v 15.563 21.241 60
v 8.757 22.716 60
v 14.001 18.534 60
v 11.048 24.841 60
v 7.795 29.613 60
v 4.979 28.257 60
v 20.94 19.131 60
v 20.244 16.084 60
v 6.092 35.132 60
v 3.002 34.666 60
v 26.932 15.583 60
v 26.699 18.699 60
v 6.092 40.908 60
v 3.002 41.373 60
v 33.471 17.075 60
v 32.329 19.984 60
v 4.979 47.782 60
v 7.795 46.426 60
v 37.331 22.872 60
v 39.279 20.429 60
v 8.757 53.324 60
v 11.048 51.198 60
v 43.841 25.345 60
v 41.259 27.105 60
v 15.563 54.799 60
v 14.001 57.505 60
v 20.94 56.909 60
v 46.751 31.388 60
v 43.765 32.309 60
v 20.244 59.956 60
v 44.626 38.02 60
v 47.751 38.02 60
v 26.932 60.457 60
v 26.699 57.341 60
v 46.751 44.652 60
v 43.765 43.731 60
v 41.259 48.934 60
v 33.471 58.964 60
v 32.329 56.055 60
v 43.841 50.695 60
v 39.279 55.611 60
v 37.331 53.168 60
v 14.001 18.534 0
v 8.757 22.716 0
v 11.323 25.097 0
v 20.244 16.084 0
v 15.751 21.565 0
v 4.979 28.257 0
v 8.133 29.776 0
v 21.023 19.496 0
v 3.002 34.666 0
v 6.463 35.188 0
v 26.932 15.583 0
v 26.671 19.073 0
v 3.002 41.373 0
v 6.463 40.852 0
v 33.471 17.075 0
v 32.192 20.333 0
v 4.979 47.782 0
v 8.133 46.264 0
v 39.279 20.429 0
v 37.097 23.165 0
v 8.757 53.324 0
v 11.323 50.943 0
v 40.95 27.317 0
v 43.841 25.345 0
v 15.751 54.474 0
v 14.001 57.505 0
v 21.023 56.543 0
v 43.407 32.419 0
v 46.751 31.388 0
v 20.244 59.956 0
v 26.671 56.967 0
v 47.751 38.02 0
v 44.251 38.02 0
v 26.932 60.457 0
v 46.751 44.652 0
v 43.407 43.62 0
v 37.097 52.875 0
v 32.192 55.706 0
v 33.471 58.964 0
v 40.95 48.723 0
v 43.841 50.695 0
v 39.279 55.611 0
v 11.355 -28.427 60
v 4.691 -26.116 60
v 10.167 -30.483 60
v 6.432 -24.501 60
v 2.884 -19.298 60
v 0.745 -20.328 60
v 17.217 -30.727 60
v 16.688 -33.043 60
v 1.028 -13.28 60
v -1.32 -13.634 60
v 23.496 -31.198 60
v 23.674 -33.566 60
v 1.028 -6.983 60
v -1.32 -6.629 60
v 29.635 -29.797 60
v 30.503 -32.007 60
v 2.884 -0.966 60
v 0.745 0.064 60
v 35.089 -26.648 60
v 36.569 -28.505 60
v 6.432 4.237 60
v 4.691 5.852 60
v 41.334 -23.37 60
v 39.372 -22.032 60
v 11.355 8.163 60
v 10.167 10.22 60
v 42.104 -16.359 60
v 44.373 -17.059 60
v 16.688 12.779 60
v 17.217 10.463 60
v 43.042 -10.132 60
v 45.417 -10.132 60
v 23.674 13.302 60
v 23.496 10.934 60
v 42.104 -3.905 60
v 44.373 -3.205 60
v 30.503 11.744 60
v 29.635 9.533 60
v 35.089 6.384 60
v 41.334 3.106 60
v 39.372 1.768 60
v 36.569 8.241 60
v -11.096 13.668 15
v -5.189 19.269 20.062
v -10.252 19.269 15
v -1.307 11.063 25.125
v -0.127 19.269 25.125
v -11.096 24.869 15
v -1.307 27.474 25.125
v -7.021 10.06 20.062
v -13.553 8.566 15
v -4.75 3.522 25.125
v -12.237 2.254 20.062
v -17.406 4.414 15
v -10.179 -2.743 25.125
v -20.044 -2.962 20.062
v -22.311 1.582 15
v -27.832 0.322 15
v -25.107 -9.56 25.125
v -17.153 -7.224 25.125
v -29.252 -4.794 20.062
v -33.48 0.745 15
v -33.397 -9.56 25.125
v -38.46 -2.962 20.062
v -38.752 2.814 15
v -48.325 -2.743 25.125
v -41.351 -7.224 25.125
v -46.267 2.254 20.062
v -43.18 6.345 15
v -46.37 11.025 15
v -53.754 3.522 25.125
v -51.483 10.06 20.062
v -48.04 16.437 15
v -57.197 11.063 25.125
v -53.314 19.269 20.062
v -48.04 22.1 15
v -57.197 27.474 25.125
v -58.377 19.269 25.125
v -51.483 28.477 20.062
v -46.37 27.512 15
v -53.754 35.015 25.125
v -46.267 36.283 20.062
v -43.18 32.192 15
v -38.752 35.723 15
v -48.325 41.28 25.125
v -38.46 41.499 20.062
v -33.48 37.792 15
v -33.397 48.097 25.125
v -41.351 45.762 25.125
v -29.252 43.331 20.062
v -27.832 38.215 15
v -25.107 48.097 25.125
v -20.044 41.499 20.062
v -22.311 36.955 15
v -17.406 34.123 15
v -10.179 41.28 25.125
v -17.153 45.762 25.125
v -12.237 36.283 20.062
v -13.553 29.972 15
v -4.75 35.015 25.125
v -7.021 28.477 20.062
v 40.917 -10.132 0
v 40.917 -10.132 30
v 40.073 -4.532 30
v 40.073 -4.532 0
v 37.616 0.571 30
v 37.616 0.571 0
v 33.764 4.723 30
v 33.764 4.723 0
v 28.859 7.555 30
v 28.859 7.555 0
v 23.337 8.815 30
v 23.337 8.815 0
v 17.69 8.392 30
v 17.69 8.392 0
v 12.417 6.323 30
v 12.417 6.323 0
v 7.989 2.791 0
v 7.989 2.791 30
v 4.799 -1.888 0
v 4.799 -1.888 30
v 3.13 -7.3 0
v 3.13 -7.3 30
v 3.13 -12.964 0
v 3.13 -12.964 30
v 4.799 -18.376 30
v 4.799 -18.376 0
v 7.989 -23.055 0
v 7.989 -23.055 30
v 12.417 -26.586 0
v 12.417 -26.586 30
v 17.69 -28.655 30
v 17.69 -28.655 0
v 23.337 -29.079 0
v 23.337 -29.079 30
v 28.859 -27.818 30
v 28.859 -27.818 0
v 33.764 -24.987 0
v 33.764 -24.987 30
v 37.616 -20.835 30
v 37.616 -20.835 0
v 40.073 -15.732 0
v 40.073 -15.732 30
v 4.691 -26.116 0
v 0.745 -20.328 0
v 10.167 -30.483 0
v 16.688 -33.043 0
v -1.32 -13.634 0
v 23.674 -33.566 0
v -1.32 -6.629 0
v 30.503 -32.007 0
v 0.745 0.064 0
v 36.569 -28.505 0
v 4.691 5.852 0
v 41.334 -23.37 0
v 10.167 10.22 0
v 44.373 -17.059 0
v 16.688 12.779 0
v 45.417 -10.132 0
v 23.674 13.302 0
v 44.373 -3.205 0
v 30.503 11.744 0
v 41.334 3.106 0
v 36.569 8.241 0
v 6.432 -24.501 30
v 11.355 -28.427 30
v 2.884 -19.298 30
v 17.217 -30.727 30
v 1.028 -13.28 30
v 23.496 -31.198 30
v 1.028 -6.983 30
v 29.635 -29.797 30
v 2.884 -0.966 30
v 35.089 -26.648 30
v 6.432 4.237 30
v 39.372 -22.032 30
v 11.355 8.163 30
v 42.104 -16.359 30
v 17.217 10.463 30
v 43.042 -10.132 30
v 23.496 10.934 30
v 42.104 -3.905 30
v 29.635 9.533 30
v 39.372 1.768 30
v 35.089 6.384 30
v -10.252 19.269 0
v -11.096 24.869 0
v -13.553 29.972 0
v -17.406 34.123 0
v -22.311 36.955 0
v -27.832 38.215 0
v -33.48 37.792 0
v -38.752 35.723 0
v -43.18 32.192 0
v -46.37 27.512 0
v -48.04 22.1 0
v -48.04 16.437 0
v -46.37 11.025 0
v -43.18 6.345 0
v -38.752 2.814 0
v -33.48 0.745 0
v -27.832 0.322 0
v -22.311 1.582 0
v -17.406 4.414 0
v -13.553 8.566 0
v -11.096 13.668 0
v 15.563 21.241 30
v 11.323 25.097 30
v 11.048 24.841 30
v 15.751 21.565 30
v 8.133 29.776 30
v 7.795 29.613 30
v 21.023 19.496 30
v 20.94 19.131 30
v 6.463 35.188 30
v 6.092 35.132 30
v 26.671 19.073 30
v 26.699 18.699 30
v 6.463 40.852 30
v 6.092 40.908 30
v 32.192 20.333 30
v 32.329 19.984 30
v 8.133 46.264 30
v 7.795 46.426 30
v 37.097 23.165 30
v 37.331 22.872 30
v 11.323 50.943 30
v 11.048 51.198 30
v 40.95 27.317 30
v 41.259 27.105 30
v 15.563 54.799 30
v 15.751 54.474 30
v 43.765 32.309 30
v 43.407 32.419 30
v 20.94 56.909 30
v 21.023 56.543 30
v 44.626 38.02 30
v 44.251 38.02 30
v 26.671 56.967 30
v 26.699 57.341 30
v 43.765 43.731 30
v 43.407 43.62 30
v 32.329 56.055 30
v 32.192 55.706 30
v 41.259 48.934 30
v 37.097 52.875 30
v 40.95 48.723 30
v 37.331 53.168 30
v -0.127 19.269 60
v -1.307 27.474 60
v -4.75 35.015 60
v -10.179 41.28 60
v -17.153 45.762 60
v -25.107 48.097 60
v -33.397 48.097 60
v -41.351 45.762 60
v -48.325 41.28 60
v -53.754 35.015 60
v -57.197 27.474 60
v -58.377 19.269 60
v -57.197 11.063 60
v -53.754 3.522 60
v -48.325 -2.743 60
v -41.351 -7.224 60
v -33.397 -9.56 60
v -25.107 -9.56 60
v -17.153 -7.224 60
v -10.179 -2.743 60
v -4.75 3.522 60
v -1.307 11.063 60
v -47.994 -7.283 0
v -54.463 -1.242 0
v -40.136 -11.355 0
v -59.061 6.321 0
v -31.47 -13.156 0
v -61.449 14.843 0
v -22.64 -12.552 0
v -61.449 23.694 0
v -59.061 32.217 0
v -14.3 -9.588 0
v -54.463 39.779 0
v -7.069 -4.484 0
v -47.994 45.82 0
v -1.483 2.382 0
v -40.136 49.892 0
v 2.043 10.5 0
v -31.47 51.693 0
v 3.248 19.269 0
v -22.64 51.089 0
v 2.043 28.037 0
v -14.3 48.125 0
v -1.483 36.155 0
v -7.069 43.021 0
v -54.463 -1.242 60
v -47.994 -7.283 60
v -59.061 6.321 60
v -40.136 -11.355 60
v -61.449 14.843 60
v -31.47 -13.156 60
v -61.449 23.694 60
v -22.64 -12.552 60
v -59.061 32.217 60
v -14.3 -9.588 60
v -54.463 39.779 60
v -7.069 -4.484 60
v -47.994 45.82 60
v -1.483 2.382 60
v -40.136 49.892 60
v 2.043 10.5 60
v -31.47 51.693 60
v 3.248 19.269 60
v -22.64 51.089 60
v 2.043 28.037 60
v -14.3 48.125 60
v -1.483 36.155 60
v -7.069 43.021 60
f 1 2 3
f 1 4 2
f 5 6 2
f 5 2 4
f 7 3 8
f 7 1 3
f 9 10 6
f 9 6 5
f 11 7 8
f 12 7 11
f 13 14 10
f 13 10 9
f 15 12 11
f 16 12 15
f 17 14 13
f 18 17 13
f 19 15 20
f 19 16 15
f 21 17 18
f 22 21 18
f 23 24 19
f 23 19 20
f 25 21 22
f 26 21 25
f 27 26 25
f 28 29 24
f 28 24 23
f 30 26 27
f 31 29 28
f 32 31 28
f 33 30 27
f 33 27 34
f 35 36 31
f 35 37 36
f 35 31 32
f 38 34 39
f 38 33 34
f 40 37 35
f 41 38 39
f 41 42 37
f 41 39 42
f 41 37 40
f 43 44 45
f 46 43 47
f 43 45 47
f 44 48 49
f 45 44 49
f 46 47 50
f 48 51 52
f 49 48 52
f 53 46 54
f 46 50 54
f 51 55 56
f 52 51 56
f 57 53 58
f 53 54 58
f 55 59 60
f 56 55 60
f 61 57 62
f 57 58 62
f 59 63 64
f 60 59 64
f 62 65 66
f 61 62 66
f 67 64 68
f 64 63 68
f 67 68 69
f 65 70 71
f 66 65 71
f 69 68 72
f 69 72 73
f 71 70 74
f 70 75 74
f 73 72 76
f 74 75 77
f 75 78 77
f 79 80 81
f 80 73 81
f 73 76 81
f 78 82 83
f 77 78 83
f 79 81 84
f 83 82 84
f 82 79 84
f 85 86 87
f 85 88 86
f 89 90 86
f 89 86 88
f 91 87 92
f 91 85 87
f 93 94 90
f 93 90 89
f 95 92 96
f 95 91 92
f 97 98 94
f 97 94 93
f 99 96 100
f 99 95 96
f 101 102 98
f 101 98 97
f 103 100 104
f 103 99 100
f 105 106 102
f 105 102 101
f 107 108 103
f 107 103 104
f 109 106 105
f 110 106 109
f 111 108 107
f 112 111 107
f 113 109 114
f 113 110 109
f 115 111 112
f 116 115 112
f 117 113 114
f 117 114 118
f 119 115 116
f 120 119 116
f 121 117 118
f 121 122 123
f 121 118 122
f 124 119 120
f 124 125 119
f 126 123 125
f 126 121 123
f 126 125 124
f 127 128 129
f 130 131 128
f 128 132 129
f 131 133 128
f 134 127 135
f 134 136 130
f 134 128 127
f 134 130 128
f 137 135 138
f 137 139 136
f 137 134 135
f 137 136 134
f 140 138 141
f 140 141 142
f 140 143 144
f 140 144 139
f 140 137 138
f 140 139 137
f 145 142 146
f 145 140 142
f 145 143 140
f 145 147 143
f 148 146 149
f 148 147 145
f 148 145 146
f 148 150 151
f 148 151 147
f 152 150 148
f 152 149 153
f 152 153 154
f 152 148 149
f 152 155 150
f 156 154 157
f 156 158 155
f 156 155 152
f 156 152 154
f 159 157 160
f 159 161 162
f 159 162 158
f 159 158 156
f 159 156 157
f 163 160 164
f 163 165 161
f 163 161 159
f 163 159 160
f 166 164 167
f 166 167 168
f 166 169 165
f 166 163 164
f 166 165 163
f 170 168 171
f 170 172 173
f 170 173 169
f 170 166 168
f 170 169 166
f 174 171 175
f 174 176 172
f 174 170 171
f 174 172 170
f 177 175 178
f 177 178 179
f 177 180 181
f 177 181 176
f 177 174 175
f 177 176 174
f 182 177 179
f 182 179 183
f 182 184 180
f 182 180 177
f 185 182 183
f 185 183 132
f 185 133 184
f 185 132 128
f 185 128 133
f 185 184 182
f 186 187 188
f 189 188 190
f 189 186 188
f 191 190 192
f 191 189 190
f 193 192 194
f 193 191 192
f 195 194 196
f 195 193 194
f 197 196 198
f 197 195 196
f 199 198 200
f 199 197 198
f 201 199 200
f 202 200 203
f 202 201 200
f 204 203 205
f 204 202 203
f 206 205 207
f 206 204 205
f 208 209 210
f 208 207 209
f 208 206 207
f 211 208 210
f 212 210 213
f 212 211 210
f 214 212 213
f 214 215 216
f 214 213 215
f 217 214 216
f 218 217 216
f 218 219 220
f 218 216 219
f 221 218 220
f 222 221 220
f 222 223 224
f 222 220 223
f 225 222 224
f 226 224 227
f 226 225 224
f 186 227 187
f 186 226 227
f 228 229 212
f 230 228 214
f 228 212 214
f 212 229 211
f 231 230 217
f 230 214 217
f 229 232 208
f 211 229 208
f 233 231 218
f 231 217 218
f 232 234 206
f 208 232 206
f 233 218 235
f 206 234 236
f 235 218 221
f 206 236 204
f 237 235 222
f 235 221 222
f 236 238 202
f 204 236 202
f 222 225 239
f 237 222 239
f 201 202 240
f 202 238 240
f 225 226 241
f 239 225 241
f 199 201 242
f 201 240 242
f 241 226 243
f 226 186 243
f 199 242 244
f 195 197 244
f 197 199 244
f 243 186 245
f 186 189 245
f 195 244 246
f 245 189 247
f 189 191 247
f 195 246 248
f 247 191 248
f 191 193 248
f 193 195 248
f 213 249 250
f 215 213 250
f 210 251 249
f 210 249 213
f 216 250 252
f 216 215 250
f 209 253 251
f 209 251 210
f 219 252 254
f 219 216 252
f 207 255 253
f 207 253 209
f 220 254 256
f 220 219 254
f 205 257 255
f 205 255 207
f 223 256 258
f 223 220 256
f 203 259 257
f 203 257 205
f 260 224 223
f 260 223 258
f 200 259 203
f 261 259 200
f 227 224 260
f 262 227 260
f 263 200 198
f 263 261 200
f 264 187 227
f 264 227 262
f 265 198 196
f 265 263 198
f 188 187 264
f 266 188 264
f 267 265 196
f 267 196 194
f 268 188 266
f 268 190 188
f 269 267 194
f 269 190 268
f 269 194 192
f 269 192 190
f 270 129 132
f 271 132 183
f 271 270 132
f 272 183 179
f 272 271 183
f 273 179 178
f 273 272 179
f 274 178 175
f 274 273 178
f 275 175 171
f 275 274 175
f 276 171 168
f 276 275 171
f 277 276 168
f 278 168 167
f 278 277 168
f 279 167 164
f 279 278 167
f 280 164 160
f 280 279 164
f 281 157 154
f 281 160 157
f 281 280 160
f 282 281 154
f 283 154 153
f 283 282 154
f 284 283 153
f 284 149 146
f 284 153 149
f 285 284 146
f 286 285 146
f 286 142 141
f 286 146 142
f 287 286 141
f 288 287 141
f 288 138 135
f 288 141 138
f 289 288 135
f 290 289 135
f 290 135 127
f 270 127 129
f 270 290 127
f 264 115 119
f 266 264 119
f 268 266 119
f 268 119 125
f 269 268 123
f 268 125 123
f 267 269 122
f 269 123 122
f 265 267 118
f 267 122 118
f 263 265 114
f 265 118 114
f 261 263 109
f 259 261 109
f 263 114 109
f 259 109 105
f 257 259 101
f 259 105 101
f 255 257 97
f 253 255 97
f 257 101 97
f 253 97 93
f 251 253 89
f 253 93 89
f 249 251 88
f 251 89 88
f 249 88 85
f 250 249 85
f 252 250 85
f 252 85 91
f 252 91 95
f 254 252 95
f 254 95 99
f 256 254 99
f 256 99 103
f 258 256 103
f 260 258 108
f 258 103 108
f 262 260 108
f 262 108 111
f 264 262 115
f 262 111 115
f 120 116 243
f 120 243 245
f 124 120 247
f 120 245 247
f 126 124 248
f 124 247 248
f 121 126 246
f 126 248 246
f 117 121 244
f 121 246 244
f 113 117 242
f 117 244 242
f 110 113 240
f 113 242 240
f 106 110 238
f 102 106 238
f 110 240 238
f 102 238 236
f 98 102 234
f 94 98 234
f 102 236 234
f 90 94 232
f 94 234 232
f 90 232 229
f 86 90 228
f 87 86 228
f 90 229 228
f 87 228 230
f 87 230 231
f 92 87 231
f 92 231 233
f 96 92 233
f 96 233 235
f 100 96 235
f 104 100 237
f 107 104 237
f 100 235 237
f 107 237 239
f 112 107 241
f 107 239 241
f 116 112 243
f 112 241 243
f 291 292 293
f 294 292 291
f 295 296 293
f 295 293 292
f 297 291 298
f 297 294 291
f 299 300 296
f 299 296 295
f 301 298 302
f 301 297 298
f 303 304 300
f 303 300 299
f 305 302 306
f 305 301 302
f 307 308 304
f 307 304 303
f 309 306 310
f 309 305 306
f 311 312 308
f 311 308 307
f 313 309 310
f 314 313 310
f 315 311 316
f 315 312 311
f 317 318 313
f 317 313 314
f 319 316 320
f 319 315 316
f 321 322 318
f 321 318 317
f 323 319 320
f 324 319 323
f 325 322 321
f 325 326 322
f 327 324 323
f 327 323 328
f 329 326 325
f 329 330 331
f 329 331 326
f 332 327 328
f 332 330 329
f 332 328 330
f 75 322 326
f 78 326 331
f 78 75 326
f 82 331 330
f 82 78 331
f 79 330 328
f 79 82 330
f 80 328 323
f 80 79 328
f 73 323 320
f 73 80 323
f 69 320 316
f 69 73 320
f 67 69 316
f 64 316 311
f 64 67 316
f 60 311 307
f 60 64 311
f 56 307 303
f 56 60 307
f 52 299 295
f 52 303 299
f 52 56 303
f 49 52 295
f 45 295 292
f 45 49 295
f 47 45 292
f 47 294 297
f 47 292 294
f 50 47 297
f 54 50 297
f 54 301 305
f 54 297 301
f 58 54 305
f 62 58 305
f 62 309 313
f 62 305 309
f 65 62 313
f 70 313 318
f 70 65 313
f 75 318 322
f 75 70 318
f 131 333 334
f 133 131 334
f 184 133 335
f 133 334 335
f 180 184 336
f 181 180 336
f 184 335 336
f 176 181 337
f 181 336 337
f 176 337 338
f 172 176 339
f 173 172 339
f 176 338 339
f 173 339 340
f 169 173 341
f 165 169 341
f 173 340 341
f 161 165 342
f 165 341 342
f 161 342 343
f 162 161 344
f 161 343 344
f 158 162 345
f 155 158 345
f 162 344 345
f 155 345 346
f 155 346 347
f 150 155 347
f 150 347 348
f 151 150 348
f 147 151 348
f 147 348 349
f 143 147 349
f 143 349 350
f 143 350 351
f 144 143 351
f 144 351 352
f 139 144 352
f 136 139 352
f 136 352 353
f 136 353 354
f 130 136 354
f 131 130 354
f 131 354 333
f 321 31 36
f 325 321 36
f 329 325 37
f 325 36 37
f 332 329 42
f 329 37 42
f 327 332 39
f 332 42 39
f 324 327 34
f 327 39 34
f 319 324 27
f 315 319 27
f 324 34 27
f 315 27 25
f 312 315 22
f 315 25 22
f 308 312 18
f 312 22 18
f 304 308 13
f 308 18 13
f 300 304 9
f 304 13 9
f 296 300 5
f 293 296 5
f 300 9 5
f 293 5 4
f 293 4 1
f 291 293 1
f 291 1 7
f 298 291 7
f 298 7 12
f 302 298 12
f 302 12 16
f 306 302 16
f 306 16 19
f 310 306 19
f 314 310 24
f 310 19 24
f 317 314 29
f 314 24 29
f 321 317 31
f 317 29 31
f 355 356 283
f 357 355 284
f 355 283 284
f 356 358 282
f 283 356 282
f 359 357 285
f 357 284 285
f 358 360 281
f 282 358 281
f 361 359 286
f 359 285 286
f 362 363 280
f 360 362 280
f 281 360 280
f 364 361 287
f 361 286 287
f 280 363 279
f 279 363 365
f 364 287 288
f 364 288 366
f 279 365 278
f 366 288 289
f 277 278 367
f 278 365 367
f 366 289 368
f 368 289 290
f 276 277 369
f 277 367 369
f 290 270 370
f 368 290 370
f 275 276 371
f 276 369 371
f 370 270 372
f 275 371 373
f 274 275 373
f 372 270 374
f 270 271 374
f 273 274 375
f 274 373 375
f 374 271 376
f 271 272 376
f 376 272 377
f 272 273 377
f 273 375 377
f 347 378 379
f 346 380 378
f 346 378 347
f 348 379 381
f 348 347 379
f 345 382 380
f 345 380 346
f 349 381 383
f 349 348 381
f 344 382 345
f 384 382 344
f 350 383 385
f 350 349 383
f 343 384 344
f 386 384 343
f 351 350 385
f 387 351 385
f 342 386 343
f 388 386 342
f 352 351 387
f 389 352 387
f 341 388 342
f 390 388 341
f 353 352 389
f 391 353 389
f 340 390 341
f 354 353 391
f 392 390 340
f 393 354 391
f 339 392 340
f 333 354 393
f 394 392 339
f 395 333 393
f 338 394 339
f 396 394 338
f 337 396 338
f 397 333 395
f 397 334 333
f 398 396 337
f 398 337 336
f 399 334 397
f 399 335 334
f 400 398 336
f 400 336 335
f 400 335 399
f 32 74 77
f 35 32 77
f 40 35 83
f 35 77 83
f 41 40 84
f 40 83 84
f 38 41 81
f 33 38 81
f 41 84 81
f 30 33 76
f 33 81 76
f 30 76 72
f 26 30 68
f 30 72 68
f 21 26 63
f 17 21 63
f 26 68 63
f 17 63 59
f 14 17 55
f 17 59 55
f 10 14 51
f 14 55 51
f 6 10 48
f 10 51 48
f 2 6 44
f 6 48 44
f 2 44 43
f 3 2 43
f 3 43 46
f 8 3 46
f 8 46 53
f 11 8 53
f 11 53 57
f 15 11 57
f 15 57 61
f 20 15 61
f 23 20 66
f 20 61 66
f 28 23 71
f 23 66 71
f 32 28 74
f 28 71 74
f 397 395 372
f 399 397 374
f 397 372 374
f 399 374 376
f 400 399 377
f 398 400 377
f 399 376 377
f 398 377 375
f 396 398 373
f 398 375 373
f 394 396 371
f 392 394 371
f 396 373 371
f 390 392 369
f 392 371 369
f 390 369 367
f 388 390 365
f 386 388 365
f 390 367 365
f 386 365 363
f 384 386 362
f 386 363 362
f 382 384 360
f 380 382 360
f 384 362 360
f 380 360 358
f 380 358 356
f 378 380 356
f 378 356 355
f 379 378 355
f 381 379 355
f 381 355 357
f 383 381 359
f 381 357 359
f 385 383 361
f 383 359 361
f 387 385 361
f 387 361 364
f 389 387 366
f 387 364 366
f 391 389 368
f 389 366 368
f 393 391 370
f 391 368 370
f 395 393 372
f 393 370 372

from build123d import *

# Parameters (mm, degrees)
F0_R        = 32.5
F1_DEPTH    = 60
F0_R_2      = 22.5
F0_R_3      = 23.5
F2_R        = 19
F3_DEPTH    = 60
F5_R        = 29.125
F5_R_2      = 19.375
F5_R_3      = 21.125
F6_DEPTH    = 30
F7_S5_R     = 29.125
F7_T6_DEPTH = 50


# Not quite as in the source:
# - a fillet or chamfer that OpenCascade refuses, or shapes differently, is made with other operations: its cross-section is extruded or revolved along the edge and cut away or added


with BuildPart() as f1:
    # F0 (on Top) → F1 (new body)
    with BuildSketch(Plane.XY):
        with Locations((-29.2519945651, 19.268617034)):
            Circle(F0_R)
    extrude(amount=F1_DEPTH)


with BuildPart() as f1b:
    # F0 (on Top) → F1, piece 2 (new body)
    with BuildSketch(Plane.XY):
        with Locations((25.2509750426, 38.0198201165)):
            Circle(F0_R_2)
    extrude(amount=F1_DEPTH)


with BuildPart() as f1c:
    # F0 (on Top) → F1, piece 3 (new body)
    with BuildSketch(Plane.XY):
        with Locations((21.9174157828, -10.1318648085)):
            Circle(F0_R_3)
    extrude(amount=F1_DEPTH)


with BuildPart() as f3_tool:
    # F2 (on Top) → F3 (new body, through all)
    with BuildSketch(Plane.XY):
        with Locations((-29.2519945651, 19.268617034)):
            Circle(F2_R)
        with Locations((25.2509750426, 38.0198201165)):
            Circle(F2_R)
        with Locations((21.9174157828, -10.1318648085)):
            Circle(F2_R)
    extrude(amount=F3_DEPTH)


with BuildPart() as f1_1:
    add(f1.part)

    # F3: cut by f3_tool
    add(f3_tool.part, mode=Mode.SUBTRACT)


with BuildPart() as f1b_1:
    add(f1b.part)

    # F3: cut by f3_tool
    add(f3_tool.part, mode=Mode.SUBTRACT)


with BuildPart() as f1c_1:
    add(f1c.part)

    # F3: cut by f3_tool
    add(f3_tool.part, mode=Mode.SUBTRACT)


with BuildPart() as f6_tool:
    # F5 (on offset) → F6 (new body)
    with BuildSketch(Plane.XY.offset(60)):
        with Locations((-29.2519945651, 19.268617034)):
            Circle(F5_R)
        with Locations((25.2509750426, 38.0198201165)):
            Circle(F5_R_2)
        with Locations((21.9174157828, -10.1318648085)):
            Circle(F5_R_3)
    extrude(amount=-F6_DEPTH)


with BuildPart() as f1_2:
    add(f1_1.part)

    # F6: cut by f6_tool
    add(f6_tool.part, mode=Mode.SUBTRACT)

    # F7: chamfer of 15 on 1 edges, made by hand


with BuildPart() as f1b_2:
    add(f1b_1.part)

    # F6: cut by f6_tool
    add(f6_tool.part, mode=Mode.SUBTRACT)


with BuildPart() as f1c_2:
    add(f1c_1.part)

    # F6: cut by f6_tool
    add(f6_tool.part, mode=Mode.SUBTRACT)


with BuildPart() as f7_tool2:
    # F7_s3 → F7_t4 (revolve)
    with BuildSketch(Plane.XZ.offset(-19.268617034)):
        Polygon((-10.2519945651, 15), (4.7480054349, 30), (-10.2519945651, 30), align=None)
    revolve(axis=Axis((-29.2519945651, 19.268617034, 30), (0, 0, -1)))

    # F7_s5 → F7_t6 (intersect, symmetric)
    with BuildSketch(Plane.XY.offset(22.5)):
        with Locations((-29.2519945651, 19.268617034)):
            Circle(F7_S5_R)
    extrude(amount=F7_T6_DEPTH, both=True, mode=Mode.INTERSECT)


with BuildPart() as f1_3:
    add(f1_2.part)

    # F7_t1: cut F7_tool2
    add(f7_tool2.part, mode=Mode.SUBTRACT)


solid = Compound([f1b_2.part, f1c_2.part, f1_3.part])
